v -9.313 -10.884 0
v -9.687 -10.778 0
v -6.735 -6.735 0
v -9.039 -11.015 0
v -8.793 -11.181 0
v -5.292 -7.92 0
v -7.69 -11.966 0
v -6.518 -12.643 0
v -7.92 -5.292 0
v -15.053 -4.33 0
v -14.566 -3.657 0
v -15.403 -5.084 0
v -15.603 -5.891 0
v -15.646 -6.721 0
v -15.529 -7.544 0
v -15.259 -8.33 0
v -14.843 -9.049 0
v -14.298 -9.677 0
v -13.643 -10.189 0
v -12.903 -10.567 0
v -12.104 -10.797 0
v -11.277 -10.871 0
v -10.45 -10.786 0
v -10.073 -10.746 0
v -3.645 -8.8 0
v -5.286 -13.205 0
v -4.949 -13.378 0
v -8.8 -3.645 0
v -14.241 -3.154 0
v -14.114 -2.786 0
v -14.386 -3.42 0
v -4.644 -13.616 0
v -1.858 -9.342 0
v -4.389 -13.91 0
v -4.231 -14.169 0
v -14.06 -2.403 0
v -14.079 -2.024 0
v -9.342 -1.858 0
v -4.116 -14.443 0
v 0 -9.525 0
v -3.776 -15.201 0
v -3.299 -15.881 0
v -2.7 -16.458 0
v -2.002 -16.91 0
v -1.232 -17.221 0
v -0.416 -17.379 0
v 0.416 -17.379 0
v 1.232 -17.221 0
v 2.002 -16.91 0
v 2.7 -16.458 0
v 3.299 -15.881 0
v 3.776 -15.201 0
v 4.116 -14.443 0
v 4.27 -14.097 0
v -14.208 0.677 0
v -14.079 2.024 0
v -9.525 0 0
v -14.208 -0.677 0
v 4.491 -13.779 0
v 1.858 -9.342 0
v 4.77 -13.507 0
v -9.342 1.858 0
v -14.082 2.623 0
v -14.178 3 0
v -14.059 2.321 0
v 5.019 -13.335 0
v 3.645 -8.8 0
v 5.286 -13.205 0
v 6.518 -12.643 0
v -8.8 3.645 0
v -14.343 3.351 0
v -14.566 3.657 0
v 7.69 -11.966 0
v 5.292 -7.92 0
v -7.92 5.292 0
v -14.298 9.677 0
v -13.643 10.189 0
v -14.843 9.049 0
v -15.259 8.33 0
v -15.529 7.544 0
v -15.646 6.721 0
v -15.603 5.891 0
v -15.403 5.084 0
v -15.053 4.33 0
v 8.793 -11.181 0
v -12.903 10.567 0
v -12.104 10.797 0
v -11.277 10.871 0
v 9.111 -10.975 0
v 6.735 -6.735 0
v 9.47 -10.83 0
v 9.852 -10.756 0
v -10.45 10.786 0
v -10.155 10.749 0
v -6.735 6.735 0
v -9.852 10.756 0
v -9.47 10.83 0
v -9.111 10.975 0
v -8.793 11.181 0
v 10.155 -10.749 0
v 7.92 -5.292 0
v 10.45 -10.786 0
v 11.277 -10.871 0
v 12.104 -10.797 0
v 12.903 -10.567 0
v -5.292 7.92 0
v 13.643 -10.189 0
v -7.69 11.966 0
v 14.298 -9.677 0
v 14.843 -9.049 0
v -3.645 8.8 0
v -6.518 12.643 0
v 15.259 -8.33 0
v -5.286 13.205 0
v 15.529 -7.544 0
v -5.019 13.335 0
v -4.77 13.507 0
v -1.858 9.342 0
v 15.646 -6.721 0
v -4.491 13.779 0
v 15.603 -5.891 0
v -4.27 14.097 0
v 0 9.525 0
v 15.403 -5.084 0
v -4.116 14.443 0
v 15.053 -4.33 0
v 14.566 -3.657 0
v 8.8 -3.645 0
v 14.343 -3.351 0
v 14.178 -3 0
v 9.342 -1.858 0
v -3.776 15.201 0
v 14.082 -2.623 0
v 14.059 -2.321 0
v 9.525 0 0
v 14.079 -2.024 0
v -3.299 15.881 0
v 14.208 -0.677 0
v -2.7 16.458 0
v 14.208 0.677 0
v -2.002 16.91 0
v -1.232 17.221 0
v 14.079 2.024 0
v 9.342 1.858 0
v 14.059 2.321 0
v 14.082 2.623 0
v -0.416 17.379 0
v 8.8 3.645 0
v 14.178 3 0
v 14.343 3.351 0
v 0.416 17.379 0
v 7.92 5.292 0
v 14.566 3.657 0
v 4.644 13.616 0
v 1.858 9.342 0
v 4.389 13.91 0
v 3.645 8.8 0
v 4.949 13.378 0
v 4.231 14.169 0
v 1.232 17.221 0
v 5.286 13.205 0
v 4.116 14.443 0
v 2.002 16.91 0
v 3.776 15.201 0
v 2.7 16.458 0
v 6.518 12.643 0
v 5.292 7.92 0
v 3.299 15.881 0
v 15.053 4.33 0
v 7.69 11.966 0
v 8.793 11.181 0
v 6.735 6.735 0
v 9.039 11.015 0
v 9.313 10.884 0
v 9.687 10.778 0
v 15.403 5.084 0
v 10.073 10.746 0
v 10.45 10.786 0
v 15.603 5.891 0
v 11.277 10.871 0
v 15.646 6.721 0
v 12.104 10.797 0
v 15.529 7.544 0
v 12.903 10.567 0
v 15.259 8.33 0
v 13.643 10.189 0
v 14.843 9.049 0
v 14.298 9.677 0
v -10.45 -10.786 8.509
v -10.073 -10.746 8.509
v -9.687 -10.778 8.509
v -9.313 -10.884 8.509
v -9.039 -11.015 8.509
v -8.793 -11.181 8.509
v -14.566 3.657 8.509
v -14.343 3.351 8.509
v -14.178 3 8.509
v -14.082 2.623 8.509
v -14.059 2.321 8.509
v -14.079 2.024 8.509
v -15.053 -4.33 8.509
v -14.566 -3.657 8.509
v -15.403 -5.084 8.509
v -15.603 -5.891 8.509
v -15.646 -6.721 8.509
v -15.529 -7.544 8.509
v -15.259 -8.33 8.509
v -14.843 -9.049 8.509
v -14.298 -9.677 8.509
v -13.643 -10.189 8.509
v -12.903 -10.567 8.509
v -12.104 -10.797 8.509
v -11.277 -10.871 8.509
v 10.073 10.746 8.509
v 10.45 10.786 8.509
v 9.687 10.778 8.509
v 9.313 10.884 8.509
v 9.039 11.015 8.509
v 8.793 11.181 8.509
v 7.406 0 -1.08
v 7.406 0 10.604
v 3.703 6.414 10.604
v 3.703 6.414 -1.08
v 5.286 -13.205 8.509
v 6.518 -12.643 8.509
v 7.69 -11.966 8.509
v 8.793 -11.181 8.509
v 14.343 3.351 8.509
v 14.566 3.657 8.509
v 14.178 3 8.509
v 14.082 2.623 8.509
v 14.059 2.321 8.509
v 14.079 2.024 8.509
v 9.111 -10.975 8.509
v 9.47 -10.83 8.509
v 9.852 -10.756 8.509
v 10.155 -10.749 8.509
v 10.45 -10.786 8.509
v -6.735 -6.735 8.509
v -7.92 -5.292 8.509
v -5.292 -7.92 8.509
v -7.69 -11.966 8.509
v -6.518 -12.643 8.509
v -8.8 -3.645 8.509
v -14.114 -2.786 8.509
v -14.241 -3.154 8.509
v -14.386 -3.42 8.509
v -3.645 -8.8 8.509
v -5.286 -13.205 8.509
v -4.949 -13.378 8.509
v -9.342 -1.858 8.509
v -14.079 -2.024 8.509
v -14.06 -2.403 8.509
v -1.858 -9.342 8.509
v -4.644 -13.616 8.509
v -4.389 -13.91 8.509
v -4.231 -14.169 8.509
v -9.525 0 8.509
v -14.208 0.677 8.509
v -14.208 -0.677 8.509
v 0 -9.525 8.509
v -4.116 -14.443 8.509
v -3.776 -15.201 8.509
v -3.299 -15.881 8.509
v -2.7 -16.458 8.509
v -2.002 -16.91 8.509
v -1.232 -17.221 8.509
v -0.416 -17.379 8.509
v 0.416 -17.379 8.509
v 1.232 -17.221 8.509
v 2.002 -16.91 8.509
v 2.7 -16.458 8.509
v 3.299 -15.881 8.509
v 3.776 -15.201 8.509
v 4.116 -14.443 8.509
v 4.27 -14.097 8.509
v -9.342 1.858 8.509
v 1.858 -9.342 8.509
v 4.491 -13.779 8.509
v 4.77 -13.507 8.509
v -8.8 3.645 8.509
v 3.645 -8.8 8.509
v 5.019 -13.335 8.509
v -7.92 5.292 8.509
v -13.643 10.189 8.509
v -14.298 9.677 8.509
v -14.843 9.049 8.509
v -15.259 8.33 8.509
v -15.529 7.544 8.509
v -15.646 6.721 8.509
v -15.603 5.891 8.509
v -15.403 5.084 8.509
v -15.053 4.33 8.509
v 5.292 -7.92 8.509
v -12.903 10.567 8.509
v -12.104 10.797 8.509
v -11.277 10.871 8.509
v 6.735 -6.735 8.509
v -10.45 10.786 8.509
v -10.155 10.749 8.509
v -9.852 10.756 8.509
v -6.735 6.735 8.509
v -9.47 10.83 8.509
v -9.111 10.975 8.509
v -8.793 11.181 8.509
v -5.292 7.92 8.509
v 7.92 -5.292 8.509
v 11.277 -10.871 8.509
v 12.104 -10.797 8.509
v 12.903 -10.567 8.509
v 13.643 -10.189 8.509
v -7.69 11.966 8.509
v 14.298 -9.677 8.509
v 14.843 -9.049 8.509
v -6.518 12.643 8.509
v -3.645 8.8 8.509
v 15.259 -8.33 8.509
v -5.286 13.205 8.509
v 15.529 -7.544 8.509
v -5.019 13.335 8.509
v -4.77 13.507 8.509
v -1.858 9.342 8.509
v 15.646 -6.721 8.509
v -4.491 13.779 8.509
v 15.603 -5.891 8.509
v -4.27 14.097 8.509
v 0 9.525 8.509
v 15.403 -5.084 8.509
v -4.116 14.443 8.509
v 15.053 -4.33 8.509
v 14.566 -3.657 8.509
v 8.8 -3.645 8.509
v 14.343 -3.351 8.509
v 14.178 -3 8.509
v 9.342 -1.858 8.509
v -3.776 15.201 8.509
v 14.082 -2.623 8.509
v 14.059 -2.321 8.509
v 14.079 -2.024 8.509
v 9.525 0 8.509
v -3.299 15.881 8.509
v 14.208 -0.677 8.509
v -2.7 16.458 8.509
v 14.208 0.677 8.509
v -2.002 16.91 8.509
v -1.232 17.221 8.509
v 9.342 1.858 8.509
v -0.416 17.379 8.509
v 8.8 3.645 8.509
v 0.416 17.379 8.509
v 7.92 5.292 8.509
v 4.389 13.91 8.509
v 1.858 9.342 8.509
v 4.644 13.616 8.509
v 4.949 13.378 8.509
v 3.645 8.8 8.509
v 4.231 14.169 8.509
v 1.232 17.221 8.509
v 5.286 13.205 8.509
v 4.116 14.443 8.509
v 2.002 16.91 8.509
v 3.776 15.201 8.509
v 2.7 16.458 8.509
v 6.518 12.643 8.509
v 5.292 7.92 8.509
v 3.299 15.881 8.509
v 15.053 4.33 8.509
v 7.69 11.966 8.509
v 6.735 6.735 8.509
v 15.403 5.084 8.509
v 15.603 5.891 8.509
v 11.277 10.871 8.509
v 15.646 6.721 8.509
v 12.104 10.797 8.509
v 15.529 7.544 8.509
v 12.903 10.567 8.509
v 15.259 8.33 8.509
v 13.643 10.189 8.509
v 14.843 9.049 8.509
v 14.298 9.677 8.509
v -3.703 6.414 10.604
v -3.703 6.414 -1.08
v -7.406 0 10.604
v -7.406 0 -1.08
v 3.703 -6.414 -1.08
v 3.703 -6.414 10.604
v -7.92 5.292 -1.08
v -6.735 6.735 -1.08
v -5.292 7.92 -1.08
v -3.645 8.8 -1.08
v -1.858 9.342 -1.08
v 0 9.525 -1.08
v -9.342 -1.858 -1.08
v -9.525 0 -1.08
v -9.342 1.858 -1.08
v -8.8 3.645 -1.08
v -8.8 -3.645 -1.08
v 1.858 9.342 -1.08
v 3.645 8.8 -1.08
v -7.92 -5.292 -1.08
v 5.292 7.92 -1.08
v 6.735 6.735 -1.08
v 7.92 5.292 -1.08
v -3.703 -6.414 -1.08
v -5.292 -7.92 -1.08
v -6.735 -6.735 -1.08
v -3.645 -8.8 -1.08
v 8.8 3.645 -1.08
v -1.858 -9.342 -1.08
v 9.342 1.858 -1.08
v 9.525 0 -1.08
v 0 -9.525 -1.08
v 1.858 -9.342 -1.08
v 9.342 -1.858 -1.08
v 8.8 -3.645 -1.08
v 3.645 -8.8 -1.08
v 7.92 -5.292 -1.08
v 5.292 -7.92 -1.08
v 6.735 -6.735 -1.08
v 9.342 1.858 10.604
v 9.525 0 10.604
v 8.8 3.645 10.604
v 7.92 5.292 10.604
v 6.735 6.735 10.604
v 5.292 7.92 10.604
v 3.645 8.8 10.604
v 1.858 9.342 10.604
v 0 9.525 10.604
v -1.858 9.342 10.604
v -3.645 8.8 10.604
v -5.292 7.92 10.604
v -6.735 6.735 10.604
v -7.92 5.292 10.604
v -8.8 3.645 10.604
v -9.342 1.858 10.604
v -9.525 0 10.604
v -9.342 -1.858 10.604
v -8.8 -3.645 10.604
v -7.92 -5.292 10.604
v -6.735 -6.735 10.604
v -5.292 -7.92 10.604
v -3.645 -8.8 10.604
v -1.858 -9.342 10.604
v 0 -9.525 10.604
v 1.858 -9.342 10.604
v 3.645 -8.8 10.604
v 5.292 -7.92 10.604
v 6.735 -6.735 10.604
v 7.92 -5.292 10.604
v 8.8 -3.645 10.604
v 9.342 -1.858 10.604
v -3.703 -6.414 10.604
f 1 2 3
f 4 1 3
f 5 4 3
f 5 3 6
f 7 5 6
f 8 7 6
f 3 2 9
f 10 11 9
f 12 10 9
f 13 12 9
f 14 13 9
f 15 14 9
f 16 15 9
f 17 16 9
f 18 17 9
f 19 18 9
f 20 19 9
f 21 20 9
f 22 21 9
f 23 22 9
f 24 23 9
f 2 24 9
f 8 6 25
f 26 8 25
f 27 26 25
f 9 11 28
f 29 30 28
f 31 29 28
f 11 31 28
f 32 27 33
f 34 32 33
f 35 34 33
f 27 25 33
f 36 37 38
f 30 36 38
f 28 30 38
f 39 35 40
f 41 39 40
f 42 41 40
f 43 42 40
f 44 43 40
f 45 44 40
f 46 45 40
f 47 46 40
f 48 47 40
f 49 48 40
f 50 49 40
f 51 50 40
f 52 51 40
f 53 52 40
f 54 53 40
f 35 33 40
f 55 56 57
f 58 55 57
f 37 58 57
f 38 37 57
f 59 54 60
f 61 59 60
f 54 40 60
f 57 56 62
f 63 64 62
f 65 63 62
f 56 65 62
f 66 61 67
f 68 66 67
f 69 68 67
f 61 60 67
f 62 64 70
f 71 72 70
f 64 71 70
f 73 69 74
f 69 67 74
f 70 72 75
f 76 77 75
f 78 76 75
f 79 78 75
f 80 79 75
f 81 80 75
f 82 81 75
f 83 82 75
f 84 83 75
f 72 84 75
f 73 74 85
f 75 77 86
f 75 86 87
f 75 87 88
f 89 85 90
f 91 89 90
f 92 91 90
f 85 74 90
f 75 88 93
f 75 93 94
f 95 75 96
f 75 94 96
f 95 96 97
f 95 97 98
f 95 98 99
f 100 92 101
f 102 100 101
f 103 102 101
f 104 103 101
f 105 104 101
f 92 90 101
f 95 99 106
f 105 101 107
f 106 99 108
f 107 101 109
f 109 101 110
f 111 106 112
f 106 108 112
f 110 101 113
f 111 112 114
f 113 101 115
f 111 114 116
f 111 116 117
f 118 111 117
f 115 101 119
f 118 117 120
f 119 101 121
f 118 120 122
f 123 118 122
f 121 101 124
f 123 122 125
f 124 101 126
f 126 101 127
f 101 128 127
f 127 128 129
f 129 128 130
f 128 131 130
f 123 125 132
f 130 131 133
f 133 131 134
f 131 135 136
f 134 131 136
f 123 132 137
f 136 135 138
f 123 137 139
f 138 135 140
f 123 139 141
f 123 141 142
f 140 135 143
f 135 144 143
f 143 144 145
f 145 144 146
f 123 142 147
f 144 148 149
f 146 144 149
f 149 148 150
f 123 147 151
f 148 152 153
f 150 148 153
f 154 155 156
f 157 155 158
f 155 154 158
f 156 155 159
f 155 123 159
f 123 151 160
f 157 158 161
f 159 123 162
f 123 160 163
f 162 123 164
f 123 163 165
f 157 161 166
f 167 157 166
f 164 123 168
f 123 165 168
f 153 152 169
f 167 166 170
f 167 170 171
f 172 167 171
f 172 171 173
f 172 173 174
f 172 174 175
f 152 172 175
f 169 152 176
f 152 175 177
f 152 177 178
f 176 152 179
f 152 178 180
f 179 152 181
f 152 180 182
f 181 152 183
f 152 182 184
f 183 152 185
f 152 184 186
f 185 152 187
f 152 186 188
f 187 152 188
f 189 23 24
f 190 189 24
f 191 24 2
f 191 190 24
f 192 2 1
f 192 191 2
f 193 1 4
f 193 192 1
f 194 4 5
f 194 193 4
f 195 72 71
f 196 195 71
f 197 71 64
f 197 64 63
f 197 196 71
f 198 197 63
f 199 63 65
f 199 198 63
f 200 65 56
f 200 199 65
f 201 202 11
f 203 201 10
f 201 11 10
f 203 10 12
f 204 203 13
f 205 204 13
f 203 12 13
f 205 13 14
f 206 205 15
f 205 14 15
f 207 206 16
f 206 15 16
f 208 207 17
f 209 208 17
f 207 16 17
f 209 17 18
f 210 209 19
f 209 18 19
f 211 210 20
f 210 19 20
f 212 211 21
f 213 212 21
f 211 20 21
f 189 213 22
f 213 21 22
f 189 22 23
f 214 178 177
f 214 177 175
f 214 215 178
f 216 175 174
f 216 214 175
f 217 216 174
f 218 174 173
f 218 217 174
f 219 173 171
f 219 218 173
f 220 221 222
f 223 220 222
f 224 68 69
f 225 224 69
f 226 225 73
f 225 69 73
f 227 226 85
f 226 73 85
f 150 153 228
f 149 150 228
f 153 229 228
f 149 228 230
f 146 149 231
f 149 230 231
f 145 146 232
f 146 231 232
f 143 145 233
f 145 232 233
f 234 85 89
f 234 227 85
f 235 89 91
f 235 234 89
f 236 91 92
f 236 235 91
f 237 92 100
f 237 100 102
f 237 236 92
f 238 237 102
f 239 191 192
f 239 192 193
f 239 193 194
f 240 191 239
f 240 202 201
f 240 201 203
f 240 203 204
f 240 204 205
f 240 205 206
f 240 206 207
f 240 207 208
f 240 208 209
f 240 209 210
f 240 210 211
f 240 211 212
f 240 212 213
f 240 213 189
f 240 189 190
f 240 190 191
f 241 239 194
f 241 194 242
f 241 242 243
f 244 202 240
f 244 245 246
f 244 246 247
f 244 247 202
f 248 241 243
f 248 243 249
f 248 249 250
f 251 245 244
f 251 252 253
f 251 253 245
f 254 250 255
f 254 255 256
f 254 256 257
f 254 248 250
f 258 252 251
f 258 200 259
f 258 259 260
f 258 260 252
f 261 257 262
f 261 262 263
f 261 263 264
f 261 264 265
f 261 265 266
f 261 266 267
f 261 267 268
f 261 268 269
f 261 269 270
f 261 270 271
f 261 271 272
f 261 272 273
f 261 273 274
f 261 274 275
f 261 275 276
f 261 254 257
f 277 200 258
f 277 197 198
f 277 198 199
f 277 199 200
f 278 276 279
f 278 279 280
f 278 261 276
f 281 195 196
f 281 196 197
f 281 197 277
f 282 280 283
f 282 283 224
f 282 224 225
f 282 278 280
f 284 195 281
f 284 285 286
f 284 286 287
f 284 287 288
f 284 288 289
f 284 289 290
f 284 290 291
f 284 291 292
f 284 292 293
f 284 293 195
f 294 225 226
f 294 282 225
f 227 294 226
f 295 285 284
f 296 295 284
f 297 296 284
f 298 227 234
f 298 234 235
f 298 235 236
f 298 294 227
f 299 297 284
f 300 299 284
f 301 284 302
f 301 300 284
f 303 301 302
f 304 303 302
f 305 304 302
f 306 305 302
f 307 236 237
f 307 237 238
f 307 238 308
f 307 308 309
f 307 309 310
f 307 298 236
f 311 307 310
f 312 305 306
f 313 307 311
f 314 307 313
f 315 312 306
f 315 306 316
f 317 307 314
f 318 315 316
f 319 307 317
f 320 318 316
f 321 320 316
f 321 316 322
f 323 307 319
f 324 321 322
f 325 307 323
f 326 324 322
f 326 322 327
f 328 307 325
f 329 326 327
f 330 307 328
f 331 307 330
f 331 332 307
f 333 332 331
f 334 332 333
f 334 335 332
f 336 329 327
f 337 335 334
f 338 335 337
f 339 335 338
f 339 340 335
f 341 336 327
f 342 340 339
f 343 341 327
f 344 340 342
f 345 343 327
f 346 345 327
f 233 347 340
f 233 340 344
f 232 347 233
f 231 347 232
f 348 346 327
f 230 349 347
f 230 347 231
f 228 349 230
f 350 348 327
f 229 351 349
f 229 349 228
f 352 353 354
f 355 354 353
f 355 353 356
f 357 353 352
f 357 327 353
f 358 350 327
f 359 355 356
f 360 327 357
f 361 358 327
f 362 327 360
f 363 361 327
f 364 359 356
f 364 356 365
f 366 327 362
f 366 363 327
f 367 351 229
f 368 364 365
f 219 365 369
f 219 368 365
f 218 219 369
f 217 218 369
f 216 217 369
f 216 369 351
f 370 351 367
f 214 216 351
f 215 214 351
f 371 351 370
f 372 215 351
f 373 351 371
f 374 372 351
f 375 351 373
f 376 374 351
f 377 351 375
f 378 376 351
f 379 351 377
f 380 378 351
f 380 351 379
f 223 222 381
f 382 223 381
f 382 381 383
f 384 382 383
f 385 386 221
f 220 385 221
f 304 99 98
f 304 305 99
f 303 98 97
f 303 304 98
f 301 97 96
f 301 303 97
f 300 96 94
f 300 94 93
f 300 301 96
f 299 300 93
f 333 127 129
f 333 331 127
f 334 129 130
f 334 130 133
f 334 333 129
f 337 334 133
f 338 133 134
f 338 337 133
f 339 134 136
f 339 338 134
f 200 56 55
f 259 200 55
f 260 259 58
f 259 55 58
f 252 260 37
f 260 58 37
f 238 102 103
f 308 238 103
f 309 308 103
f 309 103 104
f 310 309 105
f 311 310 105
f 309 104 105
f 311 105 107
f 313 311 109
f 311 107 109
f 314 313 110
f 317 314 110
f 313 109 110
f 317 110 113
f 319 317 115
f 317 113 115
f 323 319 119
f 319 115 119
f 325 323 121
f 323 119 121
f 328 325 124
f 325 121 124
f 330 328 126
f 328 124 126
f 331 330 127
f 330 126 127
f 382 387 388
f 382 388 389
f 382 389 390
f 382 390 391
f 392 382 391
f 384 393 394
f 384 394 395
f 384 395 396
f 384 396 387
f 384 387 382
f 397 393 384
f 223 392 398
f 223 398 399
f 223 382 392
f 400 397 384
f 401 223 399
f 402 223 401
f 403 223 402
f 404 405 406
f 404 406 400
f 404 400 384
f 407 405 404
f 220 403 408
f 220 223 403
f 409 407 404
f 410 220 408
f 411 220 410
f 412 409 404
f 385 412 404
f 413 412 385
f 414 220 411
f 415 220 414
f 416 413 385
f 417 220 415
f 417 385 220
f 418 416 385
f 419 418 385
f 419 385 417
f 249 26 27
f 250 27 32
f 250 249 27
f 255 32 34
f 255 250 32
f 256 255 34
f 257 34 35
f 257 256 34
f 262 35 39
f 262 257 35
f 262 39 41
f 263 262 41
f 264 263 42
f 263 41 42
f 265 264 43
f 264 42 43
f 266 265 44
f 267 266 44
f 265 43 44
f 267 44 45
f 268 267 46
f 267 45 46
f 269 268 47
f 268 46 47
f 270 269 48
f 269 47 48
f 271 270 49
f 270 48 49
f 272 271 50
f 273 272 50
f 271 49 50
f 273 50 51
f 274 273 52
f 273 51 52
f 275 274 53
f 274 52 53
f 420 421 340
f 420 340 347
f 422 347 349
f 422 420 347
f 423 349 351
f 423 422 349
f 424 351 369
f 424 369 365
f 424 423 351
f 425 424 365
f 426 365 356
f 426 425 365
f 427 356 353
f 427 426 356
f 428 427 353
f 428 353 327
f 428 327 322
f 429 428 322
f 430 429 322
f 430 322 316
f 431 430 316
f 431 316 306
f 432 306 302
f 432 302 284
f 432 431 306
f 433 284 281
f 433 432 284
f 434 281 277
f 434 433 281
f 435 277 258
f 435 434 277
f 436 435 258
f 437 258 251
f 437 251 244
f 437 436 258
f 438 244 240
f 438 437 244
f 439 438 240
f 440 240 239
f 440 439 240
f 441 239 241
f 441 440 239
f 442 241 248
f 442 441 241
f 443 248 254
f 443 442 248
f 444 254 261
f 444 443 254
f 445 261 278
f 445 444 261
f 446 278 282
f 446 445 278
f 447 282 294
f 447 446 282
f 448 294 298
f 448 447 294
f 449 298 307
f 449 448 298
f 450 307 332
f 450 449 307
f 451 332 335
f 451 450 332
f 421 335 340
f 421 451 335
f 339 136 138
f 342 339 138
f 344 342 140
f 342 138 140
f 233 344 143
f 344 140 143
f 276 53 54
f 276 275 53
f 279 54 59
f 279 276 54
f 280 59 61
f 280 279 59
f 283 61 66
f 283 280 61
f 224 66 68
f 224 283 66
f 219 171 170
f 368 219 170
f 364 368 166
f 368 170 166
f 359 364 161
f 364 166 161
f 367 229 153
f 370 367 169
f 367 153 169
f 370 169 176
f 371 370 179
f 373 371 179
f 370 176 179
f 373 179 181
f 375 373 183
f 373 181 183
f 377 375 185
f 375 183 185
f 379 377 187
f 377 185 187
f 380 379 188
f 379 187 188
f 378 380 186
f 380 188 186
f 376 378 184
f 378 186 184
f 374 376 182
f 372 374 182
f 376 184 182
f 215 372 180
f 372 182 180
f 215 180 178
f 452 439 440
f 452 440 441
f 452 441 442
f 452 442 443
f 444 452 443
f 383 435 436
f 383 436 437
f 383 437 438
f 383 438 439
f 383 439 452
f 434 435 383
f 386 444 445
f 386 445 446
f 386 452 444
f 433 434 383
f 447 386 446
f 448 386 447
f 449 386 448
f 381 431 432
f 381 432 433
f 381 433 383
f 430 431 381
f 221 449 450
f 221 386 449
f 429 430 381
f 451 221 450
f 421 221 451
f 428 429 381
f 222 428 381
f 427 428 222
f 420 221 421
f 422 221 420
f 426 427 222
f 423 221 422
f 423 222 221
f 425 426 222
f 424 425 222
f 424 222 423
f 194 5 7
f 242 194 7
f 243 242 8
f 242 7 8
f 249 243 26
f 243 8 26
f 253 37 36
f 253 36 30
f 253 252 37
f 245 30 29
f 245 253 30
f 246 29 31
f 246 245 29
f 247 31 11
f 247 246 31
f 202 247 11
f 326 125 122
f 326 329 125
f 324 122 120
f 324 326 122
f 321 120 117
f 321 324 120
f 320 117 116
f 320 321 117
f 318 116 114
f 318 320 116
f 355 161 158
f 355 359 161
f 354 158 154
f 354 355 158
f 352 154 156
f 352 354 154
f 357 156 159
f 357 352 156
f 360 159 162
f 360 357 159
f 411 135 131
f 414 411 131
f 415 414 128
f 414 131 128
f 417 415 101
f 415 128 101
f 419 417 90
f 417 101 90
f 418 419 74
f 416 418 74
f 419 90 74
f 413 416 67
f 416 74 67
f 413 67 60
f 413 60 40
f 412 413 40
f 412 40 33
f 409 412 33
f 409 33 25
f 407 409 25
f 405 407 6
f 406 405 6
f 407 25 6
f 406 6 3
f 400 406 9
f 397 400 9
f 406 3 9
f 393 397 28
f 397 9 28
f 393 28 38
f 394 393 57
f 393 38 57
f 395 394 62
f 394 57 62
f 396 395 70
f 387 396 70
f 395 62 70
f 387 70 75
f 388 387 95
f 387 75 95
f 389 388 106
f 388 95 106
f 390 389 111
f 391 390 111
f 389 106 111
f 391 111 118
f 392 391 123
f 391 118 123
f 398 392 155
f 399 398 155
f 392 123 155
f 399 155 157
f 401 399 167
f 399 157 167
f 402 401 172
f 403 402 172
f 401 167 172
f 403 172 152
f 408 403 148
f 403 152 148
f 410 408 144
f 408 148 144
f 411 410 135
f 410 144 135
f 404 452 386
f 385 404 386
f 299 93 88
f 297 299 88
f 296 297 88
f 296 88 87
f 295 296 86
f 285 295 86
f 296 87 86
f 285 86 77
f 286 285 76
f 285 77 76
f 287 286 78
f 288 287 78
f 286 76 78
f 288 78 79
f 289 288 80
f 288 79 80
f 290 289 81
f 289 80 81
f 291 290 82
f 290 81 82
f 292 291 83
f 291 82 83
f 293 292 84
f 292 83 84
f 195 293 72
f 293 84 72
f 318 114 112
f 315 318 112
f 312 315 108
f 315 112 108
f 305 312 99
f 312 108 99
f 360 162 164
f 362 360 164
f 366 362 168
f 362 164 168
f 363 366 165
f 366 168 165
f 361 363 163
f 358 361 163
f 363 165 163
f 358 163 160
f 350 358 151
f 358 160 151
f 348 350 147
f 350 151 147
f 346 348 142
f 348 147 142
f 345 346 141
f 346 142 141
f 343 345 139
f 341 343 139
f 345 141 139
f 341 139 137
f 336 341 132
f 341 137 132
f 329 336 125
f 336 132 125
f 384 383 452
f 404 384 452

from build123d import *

# Parameters (mm, degrees)
BOSS_EXTRUDE2_DEPTH = 8.509
FILLET1_R           = 2.032
CUT_EXTRUDE1_DEPTH  = 25.900744443
SKETCH7_R           = 9.525
BOSS_EXTRUDE3_DEPTH = 1.0795
BOSS_EXTRUDE4_START = 2.0955
SKETCH8_R           = 9.525
BOSS_EXTRUDE4_DEPTH = 2.0955


with BuildPart() as part:
    # Sketch5 → Boss-Extrude2 (new body)
    with BuildSketch(Plane.XY):
        with BuildLine():
            ThreePointArc((13.895294195, 3.040226179), (15.067976, 8.6995), (9.580560202, 10.513564677))
            ThreePointArc((9.580560202, 10.513564677), (7.112, 12.318345343), (4.314733993, 13.553790856))
            ThreePointArc((4.314733993, 13.553790856), (0, 17.399), (-4.314733993, 13.553790856))
            ThreePointArc((-4.314733993, 13.553790856), (-7.112, 12.318345343), (-9.580560202, 10.513564677))
            ThreePointArc((-9.580560202, 10.513564677), (-15.067976, 8.6995), (-13.895294195, 3.040226179))
            ThreePointArc((-13.895294195, 3.040226179), (-14.224, 0), (-13.895294195, -3.040226179))
            ThreePointArc((-13.895294195, -3.040226179), (-15.067976, -8.6995), (-9.580560202, -10.513564677))
            ThreePointArc((-9.580560202, -10.513564677), (-7.112, -12.318345343), (-4.314733993, -13.553790856))
            ThreePointArc((-4.314733993, -13.553790856), (0, -17.399), (4.314733993, -13.553790856))
            ThreePointArc((4.314733993, -13.553790856), (7.112, -12.318345343), (9.580560202, -10.513564677))
            ThreePointArc((9.580560202, -10.513564677), (15.067976, -8.6995), (13.895294195, -3.040226179))
            ThreePointArc((13.895294195, -3.040226179), (14.224, 0), (13.895294195, 3.040226179))
        make_face()
    extrude(amount=BOSS_EXTRUDE2_DEPTH)

    # Fillet1
    fillet1_edges = [part.edges().sort_by_distance(p)[0] for p in [
        (-4.314733993, 13.553790856, 4.2545),
        (4.314733993, 13.553790856, 4.2545),
        (9.580560202, 10.513564677, 4.2545),
        (13.895294195, 3.040226179, 4.2545),
        (13.895294195, -3.040226179, 4.2545),
        (9.580560202, -10.513564677, 4.2545),
        (4.314733993, -13.553790856, 4.2545),
        (-4.314733993, -13.553790856, 4.2545),
        (-9.580560202, -10.513564677, 4.2545),
        (-13.895294195, -3.040226179, 4.2545),
        (-9.580560202, 10.513564677, 4.2545),
        (-13.895294195, 3.040226179, 4.2545),
    ]]
    fillet(fillet1_edges, radius=FILLET1_R)

    # Sketch6 → Cut-Extrude1 (cut, through all)
    with BuildSketch(Plane.XY.offset(8.509)):
        Polygon((7.405671903, 0), (3.702835951, 6.4135), (-3.702835951, 6.4135), (-7.405671903, 0), (-3.702835951, -6.4135), (3.702835951, -6.4135), align=None)
    extrude(amount=-CUT_EXTRUDE1_DEPTH, mode=Mode.SUBTRACT)

    # Sketch7 → Boss-Extrude3 (add)
    with BuildSketch(Plane(origin=(0, 0, 0), x_dir=(-1, 0, 0), z_dir=(0, 0, -1))):
        with Locations(Location((0, 0, 0), (0, 0, 180))):
            Circle(SKETCH7_R)
        Polygon((-7.405671903, 0), (-3.702835951, 6.4135), (3.702835951, 6.4135), (7.405671903, 0), (3.702835951, -6.4135), (-3.702835951, -6.4135), align=None, mode=Mode.SUBTRACT)
    extrude(amount=BOSS_EXTRUDE3_DEPTH)

    # Sketch8 → Boss-Extrude4 (add)
    with BuildSketch(Plane.XY.offset(8.509).offset(BOSS_EXTRUDE4_START)):
        Circle(SKETCH8_R)
        Polygon((3.702835951, -6.4135), (7.405671903, 0), (3.702835951, 6.4135), (-3.702835951, 6.4135), (-7.405671903, 0), (-3.702835951, -6.4135), align=None, mode=Mode.SUBTRACT)
    extrude(amount=-BOSS_EXTRUDE4_DEPTH)


solid = part.part
